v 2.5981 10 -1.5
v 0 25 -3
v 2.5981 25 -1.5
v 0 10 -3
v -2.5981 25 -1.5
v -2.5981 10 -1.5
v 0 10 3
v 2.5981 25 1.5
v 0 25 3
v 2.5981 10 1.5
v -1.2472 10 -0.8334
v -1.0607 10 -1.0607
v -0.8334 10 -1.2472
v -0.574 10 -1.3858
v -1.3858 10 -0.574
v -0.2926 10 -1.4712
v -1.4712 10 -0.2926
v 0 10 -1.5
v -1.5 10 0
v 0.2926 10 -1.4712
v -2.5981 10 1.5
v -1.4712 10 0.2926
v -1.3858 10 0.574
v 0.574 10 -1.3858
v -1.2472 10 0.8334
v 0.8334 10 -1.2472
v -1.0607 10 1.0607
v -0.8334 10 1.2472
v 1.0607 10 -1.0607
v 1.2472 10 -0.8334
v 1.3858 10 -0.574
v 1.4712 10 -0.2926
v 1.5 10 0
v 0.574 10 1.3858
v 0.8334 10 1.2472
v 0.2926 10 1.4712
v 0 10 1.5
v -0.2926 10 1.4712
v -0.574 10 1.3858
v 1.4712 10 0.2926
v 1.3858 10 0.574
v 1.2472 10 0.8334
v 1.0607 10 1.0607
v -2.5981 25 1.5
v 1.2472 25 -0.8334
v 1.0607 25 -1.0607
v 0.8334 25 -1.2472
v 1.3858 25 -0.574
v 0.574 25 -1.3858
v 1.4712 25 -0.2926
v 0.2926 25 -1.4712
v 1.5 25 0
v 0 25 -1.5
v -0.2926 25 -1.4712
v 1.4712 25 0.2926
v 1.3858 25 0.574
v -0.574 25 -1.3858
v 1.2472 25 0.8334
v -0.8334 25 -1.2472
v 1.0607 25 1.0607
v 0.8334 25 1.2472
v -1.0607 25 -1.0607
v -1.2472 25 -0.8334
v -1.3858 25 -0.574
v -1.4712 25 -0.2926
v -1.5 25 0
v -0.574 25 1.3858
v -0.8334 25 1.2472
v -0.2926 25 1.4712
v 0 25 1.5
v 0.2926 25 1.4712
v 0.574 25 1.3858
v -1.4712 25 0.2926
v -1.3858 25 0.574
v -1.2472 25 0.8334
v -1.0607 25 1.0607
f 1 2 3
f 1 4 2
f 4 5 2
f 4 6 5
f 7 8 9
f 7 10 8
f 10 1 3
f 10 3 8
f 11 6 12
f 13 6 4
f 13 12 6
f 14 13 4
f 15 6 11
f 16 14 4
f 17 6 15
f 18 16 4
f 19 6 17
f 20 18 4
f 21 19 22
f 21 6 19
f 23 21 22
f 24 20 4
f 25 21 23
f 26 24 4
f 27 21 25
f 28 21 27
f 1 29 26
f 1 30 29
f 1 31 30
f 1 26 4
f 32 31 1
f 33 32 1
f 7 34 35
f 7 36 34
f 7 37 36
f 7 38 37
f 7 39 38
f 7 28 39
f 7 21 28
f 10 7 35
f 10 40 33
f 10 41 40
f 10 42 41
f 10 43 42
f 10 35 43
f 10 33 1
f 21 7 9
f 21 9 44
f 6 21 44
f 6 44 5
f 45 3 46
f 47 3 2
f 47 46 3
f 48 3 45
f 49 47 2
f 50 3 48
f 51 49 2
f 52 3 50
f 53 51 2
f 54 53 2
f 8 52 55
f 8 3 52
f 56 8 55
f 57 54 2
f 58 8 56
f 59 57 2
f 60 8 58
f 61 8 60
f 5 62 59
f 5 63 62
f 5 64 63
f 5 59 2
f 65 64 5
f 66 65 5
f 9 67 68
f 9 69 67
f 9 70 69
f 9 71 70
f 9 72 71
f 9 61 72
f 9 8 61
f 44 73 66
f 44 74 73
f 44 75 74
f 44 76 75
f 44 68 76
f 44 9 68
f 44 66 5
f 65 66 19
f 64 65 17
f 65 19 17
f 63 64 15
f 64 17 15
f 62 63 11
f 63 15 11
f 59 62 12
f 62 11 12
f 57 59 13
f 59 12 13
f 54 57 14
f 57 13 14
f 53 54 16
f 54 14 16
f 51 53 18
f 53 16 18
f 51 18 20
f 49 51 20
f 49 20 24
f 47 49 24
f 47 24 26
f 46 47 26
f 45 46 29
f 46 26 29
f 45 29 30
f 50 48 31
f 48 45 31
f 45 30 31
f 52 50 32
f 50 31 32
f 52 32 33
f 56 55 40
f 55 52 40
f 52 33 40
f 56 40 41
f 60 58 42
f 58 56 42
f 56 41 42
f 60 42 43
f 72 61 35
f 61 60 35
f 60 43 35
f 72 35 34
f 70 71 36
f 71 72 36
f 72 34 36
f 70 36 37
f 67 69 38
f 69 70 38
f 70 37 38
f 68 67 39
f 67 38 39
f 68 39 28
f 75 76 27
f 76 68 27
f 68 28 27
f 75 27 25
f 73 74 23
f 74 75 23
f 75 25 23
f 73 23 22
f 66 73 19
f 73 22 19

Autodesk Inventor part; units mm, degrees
ref_plane "YZ Plane" through (0, 0, 0) normal (1, 0, 0) x (0, 1, 0)
ref_plane "XZ Plane" through (0, 0, 0) normal (0, 1, 0) x (-1, 0, 0)
ref_plane "XY Plane" through (0, 0, 0) normal (0, 0, 1) x (1, 0, 0)
sketch "Sketch1" plane through (0, 0, 0) normal (0, 1, 0) x (-1, 0, 0)
  circle A0 centre (0, 0) radius 1.5
  line L0 (0, -3) -> (-2.5981, -1.5)
  line L1 (-2.5981, -1.5) -> (-2.5981, 1.5)
  line L2 (-2.5981, 1.5) -> (0, 3)
  line L3 (0, 3) -> (2.5981, 1.5)
  line L4 (2.5981, 1.5) -> (2.5981, -1.5)
  line L5 (2.5981, -1.5) -> (0, -3)
  dimension "d0" = 3
  dimension "d1" = 3
extrude "Extrusion1" add sketch "Sketch1" along normal blind 25
thread "Thread1" size "M3x0.5" class "6H" standard "ANSI Metric M Profile" full length
sketch "Sketch2" plane through (0, 0, 0) normal (0, -1, 0) x (1, 0, 0)
  line L0 (-5.778, -4.3605) -> (5.778, -4.3605)
  line L1 (5.778, -4.3605) -> (5.778, 4.3605)
  line L2 (5.778, 4.3605) -> (-5.778, 4.3605)
  line L3 (-5.778, 4.3605) -> (-5.778, -4.3605)
  line L4 (-5.778, -4.3605) -> (5.778, 4.3605) construction
  line L5 (5.778, -4.3605) -> (-5.778, 4.3605) construction
  point P0 (0, 0)
extrude "Extrusion2" cut sketch "Sketch2" against normal blind 10
properties part number "dist25mm" material "Nylon 6/6"
